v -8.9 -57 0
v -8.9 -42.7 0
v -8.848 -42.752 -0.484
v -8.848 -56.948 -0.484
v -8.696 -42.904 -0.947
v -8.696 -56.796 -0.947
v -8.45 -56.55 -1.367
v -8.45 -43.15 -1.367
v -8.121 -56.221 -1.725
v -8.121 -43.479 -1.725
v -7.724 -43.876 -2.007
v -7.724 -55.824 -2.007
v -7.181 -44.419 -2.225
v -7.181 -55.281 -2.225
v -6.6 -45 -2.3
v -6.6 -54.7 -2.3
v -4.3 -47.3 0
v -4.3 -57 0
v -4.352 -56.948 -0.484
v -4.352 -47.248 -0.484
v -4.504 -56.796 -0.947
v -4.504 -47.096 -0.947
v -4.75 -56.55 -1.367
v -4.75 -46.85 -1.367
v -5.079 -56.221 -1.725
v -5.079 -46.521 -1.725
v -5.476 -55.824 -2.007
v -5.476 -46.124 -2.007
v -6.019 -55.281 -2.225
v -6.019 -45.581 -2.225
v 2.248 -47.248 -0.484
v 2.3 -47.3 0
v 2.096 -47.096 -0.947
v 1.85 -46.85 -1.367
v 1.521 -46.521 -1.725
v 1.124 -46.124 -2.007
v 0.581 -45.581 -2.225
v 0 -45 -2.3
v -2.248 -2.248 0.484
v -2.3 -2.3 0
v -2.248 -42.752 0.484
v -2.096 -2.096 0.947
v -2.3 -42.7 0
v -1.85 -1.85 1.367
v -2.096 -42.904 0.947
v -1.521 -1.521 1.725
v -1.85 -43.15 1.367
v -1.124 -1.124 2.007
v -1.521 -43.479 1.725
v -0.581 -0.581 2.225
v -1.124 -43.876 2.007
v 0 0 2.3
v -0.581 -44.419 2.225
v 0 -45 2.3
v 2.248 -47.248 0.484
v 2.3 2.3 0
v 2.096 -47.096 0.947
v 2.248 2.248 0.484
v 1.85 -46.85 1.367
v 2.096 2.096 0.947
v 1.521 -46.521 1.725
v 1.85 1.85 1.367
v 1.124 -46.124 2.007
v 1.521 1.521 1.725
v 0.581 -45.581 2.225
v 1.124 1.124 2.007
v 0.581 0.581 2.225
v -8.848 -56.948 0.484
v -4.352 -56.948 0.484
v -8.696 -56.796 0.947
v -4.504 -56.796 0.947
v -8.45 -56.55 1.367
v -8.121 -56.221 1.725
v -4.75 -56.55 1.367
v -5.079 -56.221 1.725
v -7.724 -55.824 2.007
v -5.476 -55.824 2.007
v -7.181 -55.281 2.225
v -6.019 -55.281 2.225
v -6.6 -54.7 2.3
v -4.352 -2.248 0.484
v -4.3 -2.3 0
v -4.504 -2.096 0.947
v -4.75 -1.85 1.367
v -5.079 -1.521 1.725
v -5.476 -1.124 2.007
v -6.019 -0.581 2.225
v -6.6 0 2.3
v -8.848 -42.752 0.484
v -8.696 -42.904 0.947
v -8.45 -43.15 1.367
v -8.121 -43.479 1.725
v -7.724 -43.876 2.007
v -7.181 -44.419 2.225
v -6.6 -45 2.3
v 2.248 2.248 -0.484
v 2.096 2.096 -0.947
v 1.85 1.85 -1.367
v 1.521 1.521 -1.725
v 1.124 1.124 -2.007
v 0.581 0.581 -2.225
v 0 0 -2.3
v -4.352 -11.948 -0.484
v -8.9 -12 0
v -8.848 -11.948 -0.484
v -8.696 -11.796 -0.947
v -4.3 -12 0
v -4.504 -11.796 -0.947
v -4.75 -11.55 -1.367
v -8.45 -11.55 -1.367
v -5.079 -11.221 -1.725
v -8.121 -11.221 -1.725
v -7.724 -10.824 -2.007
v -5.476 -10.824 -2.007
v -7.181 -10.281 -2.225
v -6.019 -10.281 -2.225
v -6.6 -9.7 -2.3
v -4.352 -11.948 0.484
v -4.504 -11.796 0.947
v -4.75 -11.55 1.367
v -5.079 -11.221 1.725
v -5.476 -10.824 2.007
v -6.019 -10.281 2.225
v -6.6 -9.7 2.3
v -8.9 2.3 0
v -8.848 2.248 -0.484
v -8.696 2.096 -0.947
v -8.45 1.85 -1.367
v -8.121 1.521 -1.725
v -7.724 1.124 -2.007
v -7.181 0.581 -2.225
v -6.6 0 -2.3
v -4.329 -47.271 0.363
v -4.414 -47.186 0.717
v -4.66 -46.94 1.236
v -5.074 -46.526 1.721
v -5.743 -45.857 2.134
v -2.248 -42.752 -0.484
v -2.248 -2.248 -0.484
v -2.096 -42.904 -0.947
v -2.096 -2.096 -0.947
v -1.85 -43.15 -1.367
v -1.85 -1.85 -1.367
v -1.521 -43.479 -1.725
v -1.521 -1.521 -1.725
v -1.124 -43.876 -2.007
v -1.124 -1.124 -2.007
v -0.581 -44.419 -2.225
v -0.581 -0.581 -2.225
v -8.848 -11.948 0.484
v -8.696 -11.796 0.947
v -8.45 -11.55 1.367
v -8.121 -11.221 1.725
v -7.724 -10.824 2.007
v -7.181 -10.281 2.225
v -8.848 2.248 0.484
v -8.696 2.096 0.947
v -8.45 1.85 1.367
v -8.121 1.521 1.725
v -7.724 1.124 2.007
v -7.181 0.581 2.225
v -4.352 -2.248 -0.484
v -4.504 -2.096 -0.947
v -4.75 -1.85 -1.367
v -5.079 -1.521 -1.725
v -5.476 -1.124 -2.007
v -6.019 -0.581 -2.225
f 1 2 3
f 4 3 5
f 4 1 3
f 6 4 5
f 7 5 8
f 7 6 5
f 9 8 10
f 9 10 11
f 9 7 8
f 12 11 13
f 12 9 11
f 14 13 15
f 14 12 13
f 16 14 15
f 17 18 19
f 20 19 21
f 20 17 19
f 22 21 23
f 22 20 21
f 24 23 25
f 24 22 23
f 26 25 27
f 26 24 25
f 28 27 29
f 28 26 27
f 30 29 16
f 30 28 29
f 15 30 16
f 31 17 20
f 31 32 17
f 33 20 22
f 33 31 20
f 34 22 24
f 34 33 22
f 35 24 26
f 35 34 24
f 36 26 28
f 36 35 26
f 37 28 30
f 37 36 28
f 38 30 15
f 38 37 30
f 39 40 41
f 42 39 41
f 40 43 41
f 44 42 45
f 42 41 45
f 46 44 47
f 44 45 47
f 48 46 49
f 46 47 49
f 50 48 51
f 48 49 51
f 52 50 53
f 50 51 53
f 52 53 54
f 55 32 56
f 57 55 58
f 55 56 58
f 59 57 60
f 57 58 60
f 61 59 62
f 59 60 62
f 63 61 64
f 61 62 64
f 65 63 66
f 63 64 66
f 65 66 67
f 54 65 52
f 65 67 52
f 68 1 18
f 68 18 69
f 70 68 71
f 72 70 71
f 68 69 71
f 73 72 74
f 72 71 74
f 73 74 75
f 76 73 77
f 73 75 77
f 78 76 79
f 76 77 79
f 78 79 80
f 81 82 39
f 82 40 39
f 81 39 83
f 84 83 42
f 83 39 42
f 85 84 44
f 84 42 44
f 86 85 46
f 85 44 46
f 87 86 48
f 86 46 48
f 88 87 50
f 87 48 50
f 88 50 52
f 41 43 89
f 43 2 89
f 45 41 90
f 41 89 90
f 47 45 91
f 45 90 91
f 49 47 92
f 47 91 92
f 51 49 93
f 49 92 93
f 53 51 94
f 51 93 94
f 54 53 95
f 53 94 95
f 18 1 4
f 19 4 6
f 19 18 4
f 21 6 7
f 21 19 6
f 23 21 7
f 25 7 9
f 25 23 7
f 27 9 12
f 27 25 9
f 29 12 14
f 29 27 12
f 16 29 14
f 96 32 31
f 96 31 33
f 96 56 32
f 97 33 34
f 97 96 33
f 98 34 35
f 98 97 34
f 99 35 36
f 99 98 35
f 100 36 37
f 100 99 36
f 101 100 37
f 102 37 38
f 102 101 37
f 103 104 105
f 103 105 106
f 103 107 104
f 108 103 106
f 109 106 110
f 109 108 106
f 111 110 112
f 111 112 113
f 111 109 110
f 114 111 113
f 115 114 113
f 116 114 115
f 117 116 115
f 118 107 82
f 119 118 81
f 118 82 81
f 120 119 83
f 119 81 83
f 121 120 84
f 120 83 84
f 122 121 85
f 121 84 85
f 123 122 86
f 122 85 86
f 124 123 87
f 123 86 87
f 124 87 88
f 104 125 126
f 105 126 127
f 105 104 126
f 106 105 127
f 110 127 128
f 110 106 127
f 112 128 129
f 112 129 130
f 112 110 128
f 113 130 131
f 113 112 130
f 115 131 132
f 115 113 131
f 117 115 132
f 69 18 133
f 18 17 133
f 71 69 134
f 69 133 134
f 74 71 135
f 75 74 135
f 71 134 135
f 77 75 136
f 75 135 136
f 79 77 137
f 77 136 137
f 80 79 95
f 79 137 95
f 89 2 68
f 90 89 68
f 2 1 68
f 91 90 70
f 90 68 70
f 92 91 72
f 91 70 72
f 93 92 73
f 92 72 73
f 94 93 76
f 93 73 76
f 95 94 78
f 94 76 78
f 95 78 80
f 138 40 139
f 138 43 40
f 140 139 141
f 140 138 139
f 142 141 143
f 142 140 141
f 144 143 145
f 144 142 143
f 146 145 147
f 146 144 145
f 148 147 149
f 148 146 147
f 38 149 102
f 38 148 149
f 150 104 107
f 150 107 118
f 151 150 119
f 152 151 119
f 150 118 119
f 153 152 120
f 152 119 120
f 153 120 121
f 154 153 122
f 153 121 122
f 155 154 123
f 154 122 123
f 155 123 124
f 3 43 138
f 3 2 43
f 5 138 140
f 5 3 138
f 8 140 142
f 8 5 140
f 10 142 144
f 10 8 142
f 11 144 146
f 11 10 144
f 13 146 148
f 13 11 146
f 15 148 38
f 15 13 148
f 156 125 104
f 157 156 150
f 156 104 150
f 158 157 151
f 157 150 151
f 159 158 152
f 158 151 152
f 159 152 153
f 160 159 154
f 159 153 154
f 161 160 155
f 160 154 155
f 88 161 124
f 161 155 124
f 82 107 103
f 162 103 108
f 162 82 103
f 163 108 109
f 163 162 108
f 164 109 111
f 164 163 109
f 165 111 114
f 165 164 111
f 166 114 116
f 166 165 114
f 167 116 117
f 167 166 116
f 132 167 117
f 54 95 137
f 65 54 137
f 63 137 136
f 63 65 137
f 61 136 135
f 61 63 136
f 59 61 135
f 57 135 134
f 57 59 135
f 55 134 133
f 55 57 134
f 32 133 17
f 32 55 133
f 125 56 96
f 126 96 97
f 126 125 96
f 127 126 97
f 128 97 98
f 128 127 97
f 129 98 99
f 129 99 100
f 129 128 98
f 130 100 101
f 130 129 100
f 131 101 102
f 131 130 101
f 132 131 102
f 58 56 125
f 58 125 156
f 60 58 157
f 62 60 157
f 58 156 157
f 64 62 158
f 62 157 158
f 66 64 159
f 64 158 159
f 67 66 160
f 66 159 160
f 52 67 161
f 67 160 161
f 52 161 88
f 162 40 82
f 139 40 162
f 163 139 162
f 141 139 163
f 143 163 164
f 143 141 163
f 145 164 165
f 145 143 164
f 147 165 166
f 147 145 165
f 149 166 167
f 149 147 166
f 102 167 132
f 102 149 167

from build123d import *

# Parameters (mm, degrees)
EXTRU_MINCE1_DEPTH = 2.3
CONG_1_R           = 2.3


with BuildPart() as part:
    # Esquisse1 → Extru.-Mince1 (new, symmetric)
    with BuildSketch(Plane.XY):
        Polygon((-4.3, -57), (-4.3, -47.3), (2.3, -47.3), (2.3, 2.3), (-8.9, 2.3), (-8.9, -12), (-4.3, -12), (-4.3, -2.3), (-2.3, -2.3), (-2.3, -42.7), (-8.9, -42.7), (-8.9, -57), align=None)
    extrude(amount=EXTRU_MINCE1_DEPTH, both=True)

    # Congé1
    cong_1_edges = [part.edges().sort_by_distance(p)[0] for p in [
        (-6.6, -57, -2.3),
        (-4.3, -52.15, -2.3),
        (-1, -47.3, -2.3),
        (2.3, -22.5, -2.3),
        (-3.3, 2.3, -2.3),
        (-8.9, -4.85, -2.3),
        (-6.6, -12, -2.3),
        (-4.3, -7.15, -2.3),
        (-3.3, -2.3, -2.3),
        (-2.3, -22.5, -2.3),
        (-5.6, -42.7, -2.3),
        (-8.9, -49.85, -2.3),
        (-5.6, -42.7, 2.3),
        (-2.3, -22.5, 2.3),
        (-3.3, -2.3, 2.3),
        (-4.3, -7.15, 2.3),
        (-6.6, -12, 2.3),
        (-8.9, -4.85, 2.3),
        (-3.3, 2.3, 2.3),
        (2.3, -22.5, 2.3),
        (-1, -47.3, 2.3),
        (-4.3, -52.15, 2.3),
        (-6.6, -57, 2.3),
        (-8.9, -49.85, 2.3),
    ]]
    fillet(cong_1_edges, radius=CONG_1_R - 0.0001)  # a hair under: the kernel refuses the full size


solid = part.part
